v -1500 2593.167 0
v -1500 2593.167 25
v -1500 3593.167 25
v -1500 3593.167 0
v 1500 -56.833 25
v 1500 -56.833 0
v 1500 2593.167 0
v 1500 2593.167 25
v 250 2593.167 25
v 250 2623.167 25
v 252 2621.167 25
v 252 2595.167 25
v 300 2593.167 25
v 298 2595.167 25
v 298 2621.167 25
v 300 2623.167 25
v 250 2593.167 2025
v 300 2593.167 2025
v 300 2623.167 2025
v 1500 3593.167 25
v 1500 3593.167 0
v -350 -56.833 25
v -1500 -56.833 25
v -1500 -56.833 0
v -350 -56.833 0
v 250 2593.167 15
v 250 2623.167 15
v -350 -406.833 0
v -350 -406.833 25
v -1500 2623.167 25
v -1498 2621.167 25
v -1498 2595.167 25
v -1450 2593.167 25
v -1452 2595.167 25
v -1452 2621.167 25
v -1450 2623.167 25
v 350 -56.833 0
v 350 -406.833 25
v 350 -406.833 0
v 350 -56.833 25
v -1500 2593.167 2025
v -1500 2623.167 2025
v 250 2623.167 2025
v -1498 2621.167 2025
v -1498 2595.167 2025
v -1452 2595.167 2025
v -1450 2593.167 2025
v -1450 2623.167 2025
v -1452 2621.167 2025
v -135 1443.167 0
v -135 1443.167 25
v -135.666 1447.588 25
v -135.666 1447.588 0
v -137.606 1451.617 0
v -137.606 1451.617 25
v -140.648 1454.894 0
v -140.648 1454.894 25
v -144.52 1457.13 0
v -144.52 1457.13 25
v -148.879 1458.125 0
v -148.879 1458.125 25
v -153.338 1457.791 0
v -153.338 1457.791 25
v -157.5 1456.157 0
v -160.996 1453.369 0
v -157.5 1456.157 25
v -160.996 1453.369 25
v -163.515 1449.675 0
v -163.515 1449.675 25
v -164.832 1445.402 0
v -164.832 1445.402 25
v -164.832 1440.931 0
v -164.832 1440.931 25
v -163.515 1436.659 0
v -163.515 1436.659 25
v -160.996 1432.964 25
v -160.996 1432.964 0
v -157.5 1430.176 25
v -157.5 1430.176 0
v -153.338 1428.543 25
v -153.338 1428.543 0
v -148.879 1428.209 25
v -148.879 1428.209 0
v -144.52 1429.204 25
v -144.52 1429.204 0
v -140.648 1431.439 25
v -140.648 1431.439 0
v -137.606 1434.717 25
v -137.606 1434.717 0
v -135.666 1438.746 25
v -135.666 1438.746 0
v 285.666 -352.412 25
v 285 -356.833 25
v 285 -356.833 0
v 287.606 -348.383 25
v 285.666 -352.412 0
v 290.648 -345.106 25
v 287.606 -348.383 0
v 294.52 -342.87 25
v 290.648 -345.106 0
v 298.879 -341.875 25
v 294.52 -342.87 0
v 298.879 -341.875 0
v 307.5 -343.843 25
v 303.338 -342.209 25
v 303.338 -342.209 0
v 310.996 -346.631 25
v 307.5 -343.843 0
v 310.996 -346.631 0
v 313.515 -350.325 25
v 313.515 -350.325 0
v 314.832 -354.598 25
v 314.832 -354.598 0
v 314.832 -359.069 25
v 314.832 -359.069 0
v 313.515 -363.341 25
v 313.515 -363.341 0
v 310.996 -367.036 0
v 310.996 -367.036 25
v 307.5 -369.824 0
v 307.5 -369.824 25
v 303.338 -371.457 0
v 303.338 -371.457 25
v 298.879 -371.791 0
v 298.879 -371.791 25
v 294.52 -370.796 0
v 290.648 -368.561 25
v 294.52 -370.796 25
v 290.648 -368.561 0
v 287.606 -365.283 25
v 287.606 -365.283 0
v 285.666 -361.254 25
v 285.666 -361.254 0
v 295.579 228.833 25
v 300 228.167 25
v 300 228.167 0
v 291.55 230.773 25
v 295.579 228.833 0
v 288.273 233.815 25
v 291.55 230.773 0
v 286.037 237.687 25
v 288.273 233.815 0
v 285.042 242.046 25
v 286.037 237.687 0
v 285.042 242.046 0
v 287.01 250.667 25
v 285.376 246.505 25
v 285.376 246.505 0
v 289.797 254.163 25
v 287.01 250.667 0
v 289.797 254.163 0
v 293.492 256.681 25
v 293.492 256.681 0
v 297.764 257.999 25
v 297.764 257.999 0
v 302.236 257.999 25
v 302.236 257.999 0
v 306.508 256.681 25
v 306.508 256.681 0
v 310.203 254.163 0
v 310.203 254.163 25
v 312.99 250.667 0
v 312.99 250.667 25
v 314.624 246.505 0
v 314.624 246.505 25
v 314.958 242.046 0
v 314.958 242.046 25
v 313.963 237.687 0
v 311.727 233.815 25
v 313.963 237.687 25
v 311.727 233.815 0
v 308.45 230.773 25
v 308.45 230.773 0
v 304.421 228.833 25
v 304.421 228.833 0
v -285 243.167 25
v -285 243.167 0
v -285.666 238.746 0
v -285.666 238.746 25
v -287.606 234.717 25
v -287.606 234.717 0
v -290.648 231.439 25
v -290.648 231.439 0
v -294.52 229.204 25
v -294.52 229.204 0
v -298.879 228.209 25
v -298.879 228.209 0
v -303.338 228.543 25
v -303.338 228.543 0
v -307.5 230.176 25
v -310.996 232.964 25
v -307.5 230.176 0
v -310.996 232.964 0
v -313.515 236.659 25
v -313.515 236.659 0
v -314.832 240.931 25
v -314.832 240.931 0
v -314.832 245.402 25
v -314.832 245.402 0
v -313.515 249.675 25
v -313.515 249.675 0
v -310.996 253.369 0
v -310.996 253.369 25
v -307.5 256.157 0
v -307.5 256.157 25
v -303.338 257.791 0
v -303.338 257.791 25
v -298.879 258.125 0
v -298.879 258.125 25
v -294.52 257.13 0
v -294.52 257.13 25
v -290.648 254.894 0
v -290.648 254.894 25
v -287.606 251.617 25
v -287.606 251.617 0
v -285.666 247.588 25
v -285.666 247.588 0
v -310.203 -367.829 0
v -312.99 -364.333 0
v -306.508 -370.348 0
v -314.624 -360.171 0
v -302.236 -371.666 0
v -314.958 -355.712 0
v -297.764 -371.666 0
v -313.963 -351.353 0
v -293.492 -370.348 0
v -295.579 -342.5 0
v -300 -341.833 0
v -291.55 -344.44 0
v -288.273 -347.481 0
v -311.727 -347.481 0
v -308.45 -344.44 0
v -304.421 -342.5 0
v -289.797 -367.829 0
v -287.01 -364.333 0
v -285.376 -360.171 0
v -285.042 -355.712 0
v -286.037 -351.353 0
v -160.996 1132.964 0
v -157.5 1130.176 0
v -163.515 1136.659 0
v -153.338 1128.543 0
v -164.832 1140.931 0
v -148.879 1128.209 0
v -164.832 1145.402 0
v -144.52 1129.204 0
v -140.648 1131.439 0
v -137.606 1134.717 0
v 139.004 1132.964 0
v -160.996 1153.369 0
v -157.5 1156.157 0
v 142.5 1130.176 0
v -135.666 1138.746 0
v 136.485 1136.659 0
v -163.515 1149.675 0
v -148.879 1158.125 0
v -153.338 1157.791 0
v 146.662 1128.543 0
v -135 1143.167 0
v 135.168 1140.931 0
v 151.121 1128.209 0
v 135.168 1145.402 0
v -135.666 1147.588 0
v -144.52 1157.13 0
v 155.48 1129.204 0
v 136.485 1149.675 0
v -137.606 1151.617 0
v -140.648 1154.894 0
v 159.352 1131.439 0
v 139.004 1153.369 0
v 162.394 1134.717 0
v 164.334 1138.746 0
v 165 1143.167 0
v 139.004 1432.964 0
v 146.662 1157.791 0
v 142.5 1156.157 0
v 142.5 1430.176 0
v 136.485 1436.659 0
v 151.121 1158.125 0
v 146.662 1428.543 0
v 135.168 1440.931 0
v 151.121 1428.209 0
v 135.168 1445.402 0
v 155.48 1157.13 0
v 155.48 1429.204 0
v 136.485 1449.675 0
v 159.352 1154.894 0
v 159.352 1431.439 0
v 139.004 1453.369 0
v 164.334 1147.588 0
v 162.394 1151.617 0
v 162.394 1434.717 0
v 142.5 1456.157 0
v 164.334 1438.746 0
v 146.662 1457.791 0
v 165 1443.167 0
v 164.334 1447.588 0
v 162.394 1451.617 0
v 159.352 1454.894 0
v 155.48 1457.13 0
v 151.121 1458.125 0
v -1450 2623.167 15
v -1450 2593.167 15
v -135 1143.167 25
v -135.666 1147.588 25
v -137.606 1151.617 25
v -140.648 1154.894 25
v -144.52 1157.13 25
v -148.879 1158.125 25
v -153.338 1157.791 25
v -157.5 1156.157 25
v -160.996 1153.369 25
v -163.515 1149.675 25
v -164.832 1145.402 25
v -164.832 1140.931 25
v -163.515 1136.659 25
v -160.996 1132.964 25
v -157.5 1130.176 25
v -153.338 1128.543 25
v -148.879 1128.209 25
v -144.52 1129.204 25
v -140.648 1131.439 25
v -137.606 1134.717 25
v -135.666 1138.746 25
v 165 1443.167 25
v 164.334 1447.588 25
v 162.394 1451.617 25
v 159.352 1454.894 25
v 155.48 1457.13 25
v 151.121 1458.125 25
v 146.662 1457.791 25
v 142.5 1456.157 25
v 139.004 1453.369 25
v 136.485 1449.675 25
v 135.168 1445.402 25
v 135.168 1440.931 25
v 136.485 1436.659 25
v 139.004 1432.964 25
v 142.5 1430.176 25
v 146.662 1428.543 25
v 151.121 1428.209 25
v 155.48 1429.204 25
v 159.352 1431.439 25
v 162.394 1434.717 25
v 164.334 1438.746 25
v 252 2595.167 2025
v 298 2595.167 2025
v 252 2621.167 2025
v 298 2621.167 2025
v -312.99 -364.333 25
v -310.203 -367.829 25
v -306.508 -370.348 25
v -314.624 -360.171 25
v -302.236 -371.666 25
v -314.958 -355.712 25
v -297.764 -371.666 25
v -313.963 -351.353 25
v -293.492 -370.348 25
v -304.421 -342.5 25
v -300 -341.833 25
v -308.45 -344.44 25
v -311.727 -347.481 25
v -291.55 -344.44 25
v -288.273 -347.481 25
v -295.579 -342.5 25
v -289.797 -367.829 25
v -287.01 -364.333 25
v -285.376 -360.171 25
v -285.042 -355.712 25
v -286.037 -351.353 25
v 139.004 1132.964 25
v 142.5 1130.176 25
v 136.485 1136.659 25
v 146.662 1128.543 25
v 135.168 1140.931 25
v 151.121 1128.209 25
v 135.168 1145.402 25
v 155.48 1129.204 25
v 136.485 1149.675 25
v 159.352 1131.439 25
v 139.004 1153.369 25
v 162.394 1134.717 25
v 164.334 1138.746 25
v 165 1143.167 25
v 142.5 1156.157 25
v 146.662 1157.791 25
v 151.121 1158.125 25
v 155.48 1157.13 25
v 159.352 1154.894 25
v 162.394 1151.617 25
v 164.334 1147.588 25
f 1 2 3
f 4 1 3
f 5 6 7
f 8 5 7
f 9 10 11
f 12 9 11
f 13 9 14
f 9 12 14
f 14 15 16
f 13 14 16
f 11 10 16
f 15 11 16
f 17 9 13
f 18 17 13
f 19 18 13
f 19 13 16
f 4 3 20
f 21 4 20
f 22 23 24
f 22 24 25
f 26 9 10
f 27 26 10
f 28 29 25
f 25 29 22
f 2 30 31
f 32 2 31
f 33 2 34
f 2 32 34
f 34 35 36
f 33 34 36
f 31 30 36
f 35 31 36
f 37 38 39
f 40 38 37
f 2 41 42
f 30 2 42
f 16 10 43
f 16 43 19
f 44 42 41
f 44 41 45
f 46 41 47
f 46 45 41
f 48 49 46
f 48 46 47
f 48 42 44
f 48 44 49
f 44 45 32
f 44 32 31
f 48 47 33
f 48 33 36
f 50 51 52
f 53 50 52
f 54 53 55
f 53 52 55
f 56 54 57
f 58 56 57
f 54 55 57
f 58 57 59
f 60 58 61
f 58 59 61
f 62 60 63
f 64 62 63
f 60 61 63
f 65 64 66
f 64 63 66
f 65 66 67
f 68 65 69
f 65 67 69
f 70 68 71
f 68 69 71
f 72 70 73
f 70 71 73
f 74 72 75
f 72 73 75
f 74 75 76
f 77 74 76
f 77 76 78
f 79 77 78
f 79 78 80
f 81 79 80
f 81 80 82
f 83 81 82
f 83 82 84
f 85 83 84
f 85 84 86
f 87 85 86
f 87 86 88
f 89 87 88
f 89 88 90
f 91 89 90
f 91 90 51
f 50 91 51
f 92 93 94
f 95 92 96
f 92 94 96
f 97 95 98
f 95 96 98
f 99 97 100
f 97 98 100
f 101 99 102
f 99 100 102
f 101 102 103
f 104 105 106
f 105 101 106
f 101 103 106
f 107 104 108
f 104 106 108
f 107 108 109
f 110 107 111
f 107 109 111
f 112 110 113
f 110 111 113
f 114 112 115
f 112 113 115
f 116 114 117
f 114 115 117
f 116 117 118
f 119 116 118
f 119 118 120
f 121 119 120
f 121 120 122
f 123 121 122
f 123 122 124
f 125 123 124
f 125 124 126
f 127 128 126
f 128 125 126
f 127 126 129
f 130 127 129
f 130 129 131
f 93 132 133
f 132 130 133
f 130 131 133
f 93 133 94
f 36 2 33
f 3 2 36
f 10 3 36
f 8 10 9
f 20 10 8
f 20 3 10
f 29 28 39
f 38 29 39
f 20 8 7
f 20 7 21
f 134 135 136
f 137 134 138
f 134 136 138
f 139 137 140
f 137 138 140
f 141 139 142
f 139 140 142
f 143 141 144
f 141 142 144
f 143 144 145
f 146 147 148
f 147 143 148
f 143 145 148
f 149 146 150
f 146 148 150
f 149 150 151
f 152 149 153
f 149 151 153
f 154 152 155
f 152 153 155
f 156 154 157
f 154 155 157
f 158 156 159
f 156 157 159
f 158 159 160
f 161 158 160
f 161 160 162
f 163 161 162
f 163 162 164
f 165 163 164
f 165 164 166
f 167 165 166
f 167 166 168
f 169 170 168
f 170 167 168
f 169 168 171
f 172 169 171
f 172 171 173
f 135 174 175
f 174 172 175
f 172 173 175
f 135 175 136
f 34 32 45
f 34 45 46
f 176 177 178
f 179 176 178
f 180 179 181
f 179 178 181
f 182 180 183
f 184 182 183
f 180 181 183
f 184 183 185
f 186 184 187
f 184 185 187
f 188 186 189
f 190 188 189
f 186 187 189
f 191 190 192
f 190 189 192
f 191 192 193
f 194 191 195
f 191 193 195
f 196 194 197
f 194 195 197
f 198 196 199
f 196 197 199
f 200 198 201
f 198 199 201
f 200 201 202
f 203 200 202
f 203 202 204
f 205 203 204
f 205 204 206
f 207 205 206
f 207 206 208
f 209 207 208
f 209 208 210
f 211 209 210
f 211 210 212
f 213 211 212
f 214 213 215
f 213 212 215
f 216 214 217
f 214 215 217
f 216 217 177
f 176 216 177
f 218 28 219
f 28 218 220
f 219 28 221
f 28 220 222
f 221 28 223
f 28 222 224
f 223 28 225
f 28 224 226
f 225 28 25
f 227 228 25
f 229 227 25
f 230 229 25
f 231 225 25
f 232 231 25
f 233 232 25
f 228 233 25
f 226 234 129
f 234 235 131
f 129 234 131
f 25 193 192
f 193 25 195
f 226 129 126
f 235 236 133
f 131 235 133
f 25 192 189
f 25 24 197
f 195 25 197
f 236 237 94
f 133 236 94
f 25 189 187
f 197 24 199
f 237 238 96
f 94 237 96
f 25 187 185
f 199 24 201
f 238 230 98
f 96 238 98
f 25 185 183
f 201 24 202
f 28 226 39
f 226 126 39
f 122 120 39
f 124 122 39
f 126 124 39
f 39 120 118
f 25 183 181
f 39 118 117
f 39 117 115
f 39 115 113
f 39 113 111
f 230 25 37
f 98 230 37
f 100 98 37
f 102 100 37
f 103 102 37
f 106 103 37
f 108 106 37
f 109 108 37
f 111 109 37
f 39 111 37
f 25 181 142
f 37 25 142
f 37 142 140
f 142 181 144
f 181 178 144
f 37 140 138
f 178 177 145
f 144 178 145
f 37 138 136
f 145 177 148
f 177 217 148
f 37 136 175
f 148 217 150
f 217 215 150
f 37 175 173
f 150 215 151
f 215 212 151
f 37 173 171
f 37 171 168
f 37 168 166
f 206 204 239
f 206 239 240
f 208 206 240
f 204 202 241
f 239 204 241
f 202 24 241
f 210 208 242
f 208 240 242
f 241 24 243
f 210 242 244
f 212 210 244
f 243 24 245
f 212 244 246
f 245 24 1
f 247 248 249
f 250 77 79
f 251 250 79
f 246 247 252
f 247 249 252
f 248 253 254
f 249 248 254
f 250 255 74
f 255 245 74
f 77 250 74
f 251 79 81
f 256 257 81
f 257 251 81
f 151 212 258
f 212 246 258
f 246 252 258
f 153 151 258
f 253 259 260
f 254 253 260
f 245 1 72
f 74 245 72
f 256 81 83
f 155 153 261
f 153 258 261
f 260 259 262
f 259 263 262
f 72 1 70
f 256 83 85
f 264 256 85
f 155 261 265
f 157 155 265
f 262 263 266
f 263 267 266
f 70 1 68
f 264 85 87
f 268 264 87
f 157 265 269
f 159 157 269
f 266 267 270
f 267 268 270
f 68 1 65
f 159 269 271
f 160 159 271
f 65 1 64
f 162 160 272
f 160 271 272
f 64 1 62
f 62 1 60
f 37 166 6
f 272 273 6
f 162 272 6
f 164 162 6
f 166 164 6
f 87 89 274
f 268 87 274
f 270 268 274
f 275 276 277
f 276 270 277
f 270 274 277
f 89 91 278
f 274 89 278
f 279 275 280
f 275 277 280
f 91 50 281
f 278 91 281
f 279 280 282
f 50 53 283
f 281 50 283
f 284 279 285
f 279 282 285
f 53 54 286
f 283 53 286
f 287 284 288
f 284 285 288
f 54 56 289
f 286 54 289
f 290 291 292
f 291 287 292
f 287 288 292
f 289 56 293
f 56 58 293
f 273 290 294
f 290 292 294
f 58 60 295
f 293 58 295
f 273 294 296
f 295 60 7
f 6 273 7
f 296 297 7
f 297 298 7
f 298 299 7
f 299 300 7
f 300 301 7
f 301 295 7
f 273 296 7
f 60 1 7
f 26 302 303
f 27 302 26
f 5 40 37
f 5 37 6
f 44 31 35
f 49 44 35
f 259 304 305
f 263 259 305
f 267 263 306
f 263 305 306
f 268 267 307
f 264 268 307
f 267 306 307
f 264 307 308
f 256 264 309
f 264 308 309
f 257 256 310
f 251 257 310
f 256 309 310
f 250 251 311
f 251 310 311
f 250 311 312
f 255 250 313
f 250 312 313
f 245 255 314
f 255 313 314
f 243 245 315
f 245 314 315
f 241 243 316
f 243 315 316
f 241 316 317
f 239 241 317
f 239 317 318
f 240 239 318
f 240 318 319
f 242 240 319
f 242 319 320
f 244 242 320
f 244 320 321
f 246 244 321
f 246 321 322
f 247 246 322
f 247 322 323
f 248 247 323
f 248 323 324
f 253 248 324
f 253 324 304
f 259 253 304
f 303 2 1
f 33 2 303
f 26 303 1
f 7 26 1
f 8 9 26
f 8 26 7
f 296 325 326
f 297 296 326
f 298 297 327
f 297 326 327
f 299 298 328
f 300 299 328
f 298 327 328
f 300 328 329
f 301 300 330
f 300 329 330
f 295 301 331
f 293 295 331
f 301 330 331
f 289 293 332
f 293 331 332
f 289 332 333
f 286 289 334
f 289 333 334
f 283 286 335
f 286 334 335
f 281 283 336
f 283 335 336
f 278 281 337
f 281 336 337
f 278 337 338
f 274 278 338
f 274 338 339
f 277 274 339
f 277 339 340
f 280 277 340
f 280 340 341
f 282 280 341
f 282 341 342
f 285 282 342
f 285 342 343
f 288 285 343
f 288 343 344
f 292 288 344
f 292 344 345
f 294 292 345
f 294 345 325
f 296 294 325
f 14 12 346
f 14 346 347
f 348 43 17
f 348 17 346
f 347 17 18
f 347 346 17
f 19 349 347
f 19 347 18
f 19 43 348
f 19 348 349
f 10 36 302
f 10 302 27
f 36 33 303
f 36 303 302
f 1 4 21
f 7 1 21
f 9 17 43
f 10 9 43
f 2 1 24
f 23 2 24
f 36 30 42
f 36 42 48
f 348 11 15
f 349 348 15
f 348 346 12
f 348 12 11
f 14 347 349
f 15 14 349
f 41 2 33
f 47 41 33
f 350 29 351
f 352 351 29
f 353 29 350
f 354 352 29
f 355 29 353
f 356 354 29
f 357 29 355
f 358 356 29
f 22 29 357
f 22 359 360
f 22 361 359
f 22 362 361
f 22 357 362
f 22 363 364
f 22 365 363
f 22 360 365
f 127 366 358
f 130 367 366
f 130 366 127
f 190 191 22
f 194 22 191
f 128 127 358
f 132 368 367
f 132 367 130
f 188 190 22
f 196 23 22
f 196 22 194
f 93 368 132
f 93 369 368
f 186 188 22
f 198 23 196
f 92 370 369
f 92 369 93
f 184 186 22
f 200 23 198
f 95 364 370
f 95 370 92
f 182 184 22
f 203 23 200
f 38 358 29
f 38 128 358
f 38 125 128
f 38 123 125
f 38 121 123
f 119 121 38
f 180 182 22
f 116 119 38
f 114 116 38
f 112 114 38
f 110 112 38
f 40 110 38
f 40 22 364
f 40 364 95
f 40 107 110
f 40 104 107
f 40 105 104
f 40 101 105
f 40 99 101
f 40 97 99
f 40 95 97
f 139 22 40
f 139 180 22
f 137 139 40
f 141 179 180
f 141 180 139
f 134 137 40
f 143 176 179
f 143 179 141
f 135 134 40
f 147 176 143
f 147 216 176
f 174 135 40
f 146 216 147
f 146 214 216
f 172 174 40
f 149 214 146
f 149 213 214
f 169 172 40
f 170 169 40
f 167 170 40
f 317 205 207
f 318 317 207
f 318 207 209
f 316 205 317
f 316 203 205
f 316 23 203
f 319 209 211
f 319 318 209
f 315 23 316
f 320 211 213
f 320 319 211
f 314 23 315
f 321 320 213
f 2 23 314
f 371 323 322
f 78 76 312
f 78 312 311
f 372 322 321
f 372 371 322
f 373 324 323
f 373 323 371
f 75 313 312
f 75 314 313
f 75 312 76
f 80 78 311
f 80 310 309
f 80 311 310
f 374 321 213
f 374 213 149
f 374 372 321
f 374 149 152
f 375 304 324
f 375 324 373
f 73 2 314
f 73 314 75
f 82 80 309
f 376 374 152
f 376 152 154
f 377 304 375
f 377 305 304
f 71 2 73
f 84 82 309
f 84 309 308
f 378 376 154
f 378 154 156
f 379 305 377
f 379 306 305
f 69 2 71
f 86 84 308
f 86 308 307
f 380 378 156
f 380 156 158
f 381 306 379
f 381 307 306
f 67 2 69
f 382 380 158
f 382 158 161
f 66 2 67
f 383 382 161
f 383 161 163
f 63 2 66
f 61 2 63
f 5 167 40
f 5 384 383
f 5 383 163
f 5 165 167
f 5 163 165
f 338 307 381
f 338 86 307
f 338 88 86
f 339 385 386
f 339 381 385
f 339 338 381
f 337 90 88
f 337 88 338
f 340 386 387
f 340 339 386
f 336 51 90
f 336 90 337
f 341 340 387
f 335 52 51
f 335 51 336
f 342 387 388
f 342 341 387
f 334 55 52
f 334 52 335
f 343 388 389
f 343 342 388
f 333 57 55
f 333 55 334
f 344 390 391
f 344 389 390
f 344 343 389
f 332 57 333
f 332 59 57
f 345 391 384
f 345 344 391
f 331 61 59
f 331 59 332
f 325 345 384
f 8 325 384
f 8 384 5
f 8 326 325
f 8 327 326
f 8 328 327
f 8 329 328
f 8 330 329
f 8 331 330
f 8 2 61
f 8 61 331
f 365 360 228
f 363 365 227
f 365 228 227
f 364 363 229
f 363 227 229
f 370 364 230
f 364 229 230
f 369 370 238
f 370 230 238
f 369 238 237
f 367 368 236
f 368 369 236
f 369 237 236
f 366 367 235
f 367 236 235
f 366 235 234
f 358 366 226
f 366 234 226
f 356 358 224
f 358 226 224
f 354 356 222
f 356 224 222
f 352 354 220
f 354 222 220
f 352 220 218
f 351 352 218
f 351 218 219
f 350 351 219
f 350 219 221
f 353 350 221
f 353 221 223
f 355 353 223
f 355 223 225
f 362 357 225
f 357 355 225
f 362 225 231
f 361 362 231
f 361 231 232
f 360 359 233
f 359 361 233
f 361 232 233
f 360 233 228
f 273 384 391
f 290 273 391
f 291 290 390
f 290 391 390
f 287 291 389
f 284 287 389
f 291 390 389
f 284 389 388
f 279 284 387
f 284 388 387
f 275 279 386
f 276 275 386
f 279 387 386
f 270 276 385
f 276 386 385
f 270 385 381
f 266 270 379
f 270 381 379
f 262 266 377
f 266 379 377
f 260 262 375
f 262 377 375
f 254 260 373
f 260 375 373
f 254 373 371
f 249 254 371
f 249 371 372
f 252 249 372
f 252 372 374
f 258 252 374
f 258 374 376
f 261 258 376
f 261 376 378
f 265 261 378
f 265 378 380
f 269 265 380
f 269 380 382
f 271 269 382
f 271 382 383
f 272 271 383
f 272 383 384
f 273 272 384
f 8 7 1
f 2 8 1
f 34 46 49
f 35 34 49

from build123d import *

# Parameters (mm, degrees)
F0_W      = 700
F0_H      = 700
F1_DEPTH  = 25
F2_R      = 15
F3_DEPTH  = 25
F4_R      = 15
F5_DEPTH  = 50
F6_W      = 1150
F6_H      = 350
F7_DEPTH  = 25
F8_W      = 3000
F8_H      = 1000
F9_DEPTH  = 25
F10_W     = 50
F10_H     = 30
F10_W_2   = 46
F10_H_2   = 26
F11_DEPTH = 2000
F12_W     = 1700
F12_H     = 30
F13_DEPTH = 10


with BuildPart() as f1:
    # F0 (on Top) → F1 (new body)
    with BuildSketch(Plane.XY):
        with Locations((0, -56.833140552)):
            Rectangle(F0_W, F0_H)
        with BuildLine():
            ThreePointArc((-300, 228.166859448), (-310.6066017178, 253.7734611658), (-285, 243.166859448))
            Line((-285, 243.166859448), (285, 243.166859448))
            ThreePointArc((285, 243.166859448), (300, 258.166859448), (315, 243.166859448))
            ThreePointArc((315, 243.166859448), (310.6066017178, 232.5602577302), (300, 228.166859448))
            Line((300, 228.166859448), (300, -341.833140552))
            ThreePointArc((300, -341.833140552), (310.6066017178, -346.2265388342), (315, -356.833140552))
            ThreePointArc((315, -356.833140552), (300, -371.833140552), (285, -356.833140552))
            Line((285, -356.833140552), (-285, -356.833140552))
            ThreePointArc((-285, -356.833140552), (-310.6066017178, -367.4397422698), (-300, -341.833140552))
            Line((-300, -341.833140552), (-300, 228.166859448))
        make_face(mode=Mode.SUBTRACT)
        Polygon((-1500, -406.833140552), (-350, -406.833140552), (-350, 293.166859448), (350, 293.166859448), (350, -406.833140552), (1500, -406.833140552), (1500, 2593.166859448), (0, 2593.166859448), (-1500, 2593.166859448), align=None)
        with BuildLine():
            Line((285, 243.166859448), (-285, 243.166859448))
            ThreePointArc((-285, 243.166859448), (-289.3933982822, 232.5602577302), (-300, 228.166859448))
            Line((-300, 228.166859448), (-300, -341.833140552))
            ThreePointArc((-300, -341.833140552), (-289.3933982822, -346.2265388342), (-285, -356.833140552))
            Line((-285, -356.833140552), (285, -356.833140552))
            ThreePointArc((285, -356.833140552), (289.3933982822, -346.2265388342), (300, -341.833140552))
            Line((300, -341.833140552), (300, 228.166859448))
            ThreePointArc((300, 228.166859448), (289.3933982822, 232.5602577302), (285, 243.166859448))
        make_face()
    extrude(amount=F1_DEPTH)

    # F2 (on face) → F3 (cut)
    with BuildSketch(Plane.XY.offset(25)):
        with Locations((-300, 243.166859448)):
            Circle(F2_R)
        with Locations((300, 243.166859448)):
            Circle(F2_R)
        with Locations((-300, -356.833140552)):
            Circle(F2_R)
        with Locations((300, -356.833140552)):
            Circle(F2_R)
    extrude(amount=-F3_DEPTH, mode=Mode.SUBTRACT)

    # F4 (on face) → F5 (cut)
    with BuildSketch(Plane.XY.offset(25)):
        with Locations((-150, 1443.166859448)):
            Circle(F4_R)
        with Locations((150, 1443.166859448)):
            Circle(F4_R)
        with Locations((150, 1143.166859448)):
            Circle(F4_R)
        with Locations((-150, 1143.166859448)):
            Circle(F4_R)
    extrude(amount=-F5_DEPTH, mode=Mode.SUBTRACT)

    # F6 (on face) → F7 (cut)
    with BuildSketch(Plane.XY.offset(25)):
        with Locations((-925, -231.833140552)):
            Rectangle(F6_W, F6_H)
        with Locations((925, -231.833140552)):
            Rectangle(F6_W, F6_H)
    extrude(amount=-F7_DEPTH, mode=Mode.SUBTRACT)


with BuildPart() as f9:
    # F8 (on face) → F9 (new body)
    with BuildSketch(Plane.XY.offset(25)):
        with Locations((0, 3093.166859448)):
            Rectangle(F8_W, F8_H)
    extrude(amount=-F9_DEPTH)

    # F12 (on face) → F13 (cut)
    with BuildSketch(Plane.XY.offset(25)):
        with Locations((-600, 2608.166859448)):
            Rectangle(F12_W, F12_H)
    extrude(amount=-F13_DEPTH, mode=Mode.SUBTRACT)


with BuildPart() as f11:
    # F10 (on face) → F11 (new body)
    with BuildSketch(Plane.XY.offset(25)):
        with Locations((-1475, 2608.166859448)):
            Rectangle(F10_W, F10_H)
        with Locations((-1475, 2608.166859448)):
            Rectangle(F10_W_2, F10_H_2, mode=Mode.SUBTRACT)
    extrude(amount=F11_DEPTH)


with BuildPart() as f11b:
    # F10 (on face) → F11, piece 2 (new body)
    with BuildSketch(Plane.XY.offset(25)):
        with Locations((275, 2608.166859448)):
            Rectangle(F10_W, F10_H)
        with Locations((275, 2608.166859448)):
            Rectangle(F10_W_2, F10_H_2, mode=Mode.SUBTRACT)
    extrude(amount=F11_DEPTH)


solid = Compound([f1.part, f9.part, f11.part, f11b.part])
